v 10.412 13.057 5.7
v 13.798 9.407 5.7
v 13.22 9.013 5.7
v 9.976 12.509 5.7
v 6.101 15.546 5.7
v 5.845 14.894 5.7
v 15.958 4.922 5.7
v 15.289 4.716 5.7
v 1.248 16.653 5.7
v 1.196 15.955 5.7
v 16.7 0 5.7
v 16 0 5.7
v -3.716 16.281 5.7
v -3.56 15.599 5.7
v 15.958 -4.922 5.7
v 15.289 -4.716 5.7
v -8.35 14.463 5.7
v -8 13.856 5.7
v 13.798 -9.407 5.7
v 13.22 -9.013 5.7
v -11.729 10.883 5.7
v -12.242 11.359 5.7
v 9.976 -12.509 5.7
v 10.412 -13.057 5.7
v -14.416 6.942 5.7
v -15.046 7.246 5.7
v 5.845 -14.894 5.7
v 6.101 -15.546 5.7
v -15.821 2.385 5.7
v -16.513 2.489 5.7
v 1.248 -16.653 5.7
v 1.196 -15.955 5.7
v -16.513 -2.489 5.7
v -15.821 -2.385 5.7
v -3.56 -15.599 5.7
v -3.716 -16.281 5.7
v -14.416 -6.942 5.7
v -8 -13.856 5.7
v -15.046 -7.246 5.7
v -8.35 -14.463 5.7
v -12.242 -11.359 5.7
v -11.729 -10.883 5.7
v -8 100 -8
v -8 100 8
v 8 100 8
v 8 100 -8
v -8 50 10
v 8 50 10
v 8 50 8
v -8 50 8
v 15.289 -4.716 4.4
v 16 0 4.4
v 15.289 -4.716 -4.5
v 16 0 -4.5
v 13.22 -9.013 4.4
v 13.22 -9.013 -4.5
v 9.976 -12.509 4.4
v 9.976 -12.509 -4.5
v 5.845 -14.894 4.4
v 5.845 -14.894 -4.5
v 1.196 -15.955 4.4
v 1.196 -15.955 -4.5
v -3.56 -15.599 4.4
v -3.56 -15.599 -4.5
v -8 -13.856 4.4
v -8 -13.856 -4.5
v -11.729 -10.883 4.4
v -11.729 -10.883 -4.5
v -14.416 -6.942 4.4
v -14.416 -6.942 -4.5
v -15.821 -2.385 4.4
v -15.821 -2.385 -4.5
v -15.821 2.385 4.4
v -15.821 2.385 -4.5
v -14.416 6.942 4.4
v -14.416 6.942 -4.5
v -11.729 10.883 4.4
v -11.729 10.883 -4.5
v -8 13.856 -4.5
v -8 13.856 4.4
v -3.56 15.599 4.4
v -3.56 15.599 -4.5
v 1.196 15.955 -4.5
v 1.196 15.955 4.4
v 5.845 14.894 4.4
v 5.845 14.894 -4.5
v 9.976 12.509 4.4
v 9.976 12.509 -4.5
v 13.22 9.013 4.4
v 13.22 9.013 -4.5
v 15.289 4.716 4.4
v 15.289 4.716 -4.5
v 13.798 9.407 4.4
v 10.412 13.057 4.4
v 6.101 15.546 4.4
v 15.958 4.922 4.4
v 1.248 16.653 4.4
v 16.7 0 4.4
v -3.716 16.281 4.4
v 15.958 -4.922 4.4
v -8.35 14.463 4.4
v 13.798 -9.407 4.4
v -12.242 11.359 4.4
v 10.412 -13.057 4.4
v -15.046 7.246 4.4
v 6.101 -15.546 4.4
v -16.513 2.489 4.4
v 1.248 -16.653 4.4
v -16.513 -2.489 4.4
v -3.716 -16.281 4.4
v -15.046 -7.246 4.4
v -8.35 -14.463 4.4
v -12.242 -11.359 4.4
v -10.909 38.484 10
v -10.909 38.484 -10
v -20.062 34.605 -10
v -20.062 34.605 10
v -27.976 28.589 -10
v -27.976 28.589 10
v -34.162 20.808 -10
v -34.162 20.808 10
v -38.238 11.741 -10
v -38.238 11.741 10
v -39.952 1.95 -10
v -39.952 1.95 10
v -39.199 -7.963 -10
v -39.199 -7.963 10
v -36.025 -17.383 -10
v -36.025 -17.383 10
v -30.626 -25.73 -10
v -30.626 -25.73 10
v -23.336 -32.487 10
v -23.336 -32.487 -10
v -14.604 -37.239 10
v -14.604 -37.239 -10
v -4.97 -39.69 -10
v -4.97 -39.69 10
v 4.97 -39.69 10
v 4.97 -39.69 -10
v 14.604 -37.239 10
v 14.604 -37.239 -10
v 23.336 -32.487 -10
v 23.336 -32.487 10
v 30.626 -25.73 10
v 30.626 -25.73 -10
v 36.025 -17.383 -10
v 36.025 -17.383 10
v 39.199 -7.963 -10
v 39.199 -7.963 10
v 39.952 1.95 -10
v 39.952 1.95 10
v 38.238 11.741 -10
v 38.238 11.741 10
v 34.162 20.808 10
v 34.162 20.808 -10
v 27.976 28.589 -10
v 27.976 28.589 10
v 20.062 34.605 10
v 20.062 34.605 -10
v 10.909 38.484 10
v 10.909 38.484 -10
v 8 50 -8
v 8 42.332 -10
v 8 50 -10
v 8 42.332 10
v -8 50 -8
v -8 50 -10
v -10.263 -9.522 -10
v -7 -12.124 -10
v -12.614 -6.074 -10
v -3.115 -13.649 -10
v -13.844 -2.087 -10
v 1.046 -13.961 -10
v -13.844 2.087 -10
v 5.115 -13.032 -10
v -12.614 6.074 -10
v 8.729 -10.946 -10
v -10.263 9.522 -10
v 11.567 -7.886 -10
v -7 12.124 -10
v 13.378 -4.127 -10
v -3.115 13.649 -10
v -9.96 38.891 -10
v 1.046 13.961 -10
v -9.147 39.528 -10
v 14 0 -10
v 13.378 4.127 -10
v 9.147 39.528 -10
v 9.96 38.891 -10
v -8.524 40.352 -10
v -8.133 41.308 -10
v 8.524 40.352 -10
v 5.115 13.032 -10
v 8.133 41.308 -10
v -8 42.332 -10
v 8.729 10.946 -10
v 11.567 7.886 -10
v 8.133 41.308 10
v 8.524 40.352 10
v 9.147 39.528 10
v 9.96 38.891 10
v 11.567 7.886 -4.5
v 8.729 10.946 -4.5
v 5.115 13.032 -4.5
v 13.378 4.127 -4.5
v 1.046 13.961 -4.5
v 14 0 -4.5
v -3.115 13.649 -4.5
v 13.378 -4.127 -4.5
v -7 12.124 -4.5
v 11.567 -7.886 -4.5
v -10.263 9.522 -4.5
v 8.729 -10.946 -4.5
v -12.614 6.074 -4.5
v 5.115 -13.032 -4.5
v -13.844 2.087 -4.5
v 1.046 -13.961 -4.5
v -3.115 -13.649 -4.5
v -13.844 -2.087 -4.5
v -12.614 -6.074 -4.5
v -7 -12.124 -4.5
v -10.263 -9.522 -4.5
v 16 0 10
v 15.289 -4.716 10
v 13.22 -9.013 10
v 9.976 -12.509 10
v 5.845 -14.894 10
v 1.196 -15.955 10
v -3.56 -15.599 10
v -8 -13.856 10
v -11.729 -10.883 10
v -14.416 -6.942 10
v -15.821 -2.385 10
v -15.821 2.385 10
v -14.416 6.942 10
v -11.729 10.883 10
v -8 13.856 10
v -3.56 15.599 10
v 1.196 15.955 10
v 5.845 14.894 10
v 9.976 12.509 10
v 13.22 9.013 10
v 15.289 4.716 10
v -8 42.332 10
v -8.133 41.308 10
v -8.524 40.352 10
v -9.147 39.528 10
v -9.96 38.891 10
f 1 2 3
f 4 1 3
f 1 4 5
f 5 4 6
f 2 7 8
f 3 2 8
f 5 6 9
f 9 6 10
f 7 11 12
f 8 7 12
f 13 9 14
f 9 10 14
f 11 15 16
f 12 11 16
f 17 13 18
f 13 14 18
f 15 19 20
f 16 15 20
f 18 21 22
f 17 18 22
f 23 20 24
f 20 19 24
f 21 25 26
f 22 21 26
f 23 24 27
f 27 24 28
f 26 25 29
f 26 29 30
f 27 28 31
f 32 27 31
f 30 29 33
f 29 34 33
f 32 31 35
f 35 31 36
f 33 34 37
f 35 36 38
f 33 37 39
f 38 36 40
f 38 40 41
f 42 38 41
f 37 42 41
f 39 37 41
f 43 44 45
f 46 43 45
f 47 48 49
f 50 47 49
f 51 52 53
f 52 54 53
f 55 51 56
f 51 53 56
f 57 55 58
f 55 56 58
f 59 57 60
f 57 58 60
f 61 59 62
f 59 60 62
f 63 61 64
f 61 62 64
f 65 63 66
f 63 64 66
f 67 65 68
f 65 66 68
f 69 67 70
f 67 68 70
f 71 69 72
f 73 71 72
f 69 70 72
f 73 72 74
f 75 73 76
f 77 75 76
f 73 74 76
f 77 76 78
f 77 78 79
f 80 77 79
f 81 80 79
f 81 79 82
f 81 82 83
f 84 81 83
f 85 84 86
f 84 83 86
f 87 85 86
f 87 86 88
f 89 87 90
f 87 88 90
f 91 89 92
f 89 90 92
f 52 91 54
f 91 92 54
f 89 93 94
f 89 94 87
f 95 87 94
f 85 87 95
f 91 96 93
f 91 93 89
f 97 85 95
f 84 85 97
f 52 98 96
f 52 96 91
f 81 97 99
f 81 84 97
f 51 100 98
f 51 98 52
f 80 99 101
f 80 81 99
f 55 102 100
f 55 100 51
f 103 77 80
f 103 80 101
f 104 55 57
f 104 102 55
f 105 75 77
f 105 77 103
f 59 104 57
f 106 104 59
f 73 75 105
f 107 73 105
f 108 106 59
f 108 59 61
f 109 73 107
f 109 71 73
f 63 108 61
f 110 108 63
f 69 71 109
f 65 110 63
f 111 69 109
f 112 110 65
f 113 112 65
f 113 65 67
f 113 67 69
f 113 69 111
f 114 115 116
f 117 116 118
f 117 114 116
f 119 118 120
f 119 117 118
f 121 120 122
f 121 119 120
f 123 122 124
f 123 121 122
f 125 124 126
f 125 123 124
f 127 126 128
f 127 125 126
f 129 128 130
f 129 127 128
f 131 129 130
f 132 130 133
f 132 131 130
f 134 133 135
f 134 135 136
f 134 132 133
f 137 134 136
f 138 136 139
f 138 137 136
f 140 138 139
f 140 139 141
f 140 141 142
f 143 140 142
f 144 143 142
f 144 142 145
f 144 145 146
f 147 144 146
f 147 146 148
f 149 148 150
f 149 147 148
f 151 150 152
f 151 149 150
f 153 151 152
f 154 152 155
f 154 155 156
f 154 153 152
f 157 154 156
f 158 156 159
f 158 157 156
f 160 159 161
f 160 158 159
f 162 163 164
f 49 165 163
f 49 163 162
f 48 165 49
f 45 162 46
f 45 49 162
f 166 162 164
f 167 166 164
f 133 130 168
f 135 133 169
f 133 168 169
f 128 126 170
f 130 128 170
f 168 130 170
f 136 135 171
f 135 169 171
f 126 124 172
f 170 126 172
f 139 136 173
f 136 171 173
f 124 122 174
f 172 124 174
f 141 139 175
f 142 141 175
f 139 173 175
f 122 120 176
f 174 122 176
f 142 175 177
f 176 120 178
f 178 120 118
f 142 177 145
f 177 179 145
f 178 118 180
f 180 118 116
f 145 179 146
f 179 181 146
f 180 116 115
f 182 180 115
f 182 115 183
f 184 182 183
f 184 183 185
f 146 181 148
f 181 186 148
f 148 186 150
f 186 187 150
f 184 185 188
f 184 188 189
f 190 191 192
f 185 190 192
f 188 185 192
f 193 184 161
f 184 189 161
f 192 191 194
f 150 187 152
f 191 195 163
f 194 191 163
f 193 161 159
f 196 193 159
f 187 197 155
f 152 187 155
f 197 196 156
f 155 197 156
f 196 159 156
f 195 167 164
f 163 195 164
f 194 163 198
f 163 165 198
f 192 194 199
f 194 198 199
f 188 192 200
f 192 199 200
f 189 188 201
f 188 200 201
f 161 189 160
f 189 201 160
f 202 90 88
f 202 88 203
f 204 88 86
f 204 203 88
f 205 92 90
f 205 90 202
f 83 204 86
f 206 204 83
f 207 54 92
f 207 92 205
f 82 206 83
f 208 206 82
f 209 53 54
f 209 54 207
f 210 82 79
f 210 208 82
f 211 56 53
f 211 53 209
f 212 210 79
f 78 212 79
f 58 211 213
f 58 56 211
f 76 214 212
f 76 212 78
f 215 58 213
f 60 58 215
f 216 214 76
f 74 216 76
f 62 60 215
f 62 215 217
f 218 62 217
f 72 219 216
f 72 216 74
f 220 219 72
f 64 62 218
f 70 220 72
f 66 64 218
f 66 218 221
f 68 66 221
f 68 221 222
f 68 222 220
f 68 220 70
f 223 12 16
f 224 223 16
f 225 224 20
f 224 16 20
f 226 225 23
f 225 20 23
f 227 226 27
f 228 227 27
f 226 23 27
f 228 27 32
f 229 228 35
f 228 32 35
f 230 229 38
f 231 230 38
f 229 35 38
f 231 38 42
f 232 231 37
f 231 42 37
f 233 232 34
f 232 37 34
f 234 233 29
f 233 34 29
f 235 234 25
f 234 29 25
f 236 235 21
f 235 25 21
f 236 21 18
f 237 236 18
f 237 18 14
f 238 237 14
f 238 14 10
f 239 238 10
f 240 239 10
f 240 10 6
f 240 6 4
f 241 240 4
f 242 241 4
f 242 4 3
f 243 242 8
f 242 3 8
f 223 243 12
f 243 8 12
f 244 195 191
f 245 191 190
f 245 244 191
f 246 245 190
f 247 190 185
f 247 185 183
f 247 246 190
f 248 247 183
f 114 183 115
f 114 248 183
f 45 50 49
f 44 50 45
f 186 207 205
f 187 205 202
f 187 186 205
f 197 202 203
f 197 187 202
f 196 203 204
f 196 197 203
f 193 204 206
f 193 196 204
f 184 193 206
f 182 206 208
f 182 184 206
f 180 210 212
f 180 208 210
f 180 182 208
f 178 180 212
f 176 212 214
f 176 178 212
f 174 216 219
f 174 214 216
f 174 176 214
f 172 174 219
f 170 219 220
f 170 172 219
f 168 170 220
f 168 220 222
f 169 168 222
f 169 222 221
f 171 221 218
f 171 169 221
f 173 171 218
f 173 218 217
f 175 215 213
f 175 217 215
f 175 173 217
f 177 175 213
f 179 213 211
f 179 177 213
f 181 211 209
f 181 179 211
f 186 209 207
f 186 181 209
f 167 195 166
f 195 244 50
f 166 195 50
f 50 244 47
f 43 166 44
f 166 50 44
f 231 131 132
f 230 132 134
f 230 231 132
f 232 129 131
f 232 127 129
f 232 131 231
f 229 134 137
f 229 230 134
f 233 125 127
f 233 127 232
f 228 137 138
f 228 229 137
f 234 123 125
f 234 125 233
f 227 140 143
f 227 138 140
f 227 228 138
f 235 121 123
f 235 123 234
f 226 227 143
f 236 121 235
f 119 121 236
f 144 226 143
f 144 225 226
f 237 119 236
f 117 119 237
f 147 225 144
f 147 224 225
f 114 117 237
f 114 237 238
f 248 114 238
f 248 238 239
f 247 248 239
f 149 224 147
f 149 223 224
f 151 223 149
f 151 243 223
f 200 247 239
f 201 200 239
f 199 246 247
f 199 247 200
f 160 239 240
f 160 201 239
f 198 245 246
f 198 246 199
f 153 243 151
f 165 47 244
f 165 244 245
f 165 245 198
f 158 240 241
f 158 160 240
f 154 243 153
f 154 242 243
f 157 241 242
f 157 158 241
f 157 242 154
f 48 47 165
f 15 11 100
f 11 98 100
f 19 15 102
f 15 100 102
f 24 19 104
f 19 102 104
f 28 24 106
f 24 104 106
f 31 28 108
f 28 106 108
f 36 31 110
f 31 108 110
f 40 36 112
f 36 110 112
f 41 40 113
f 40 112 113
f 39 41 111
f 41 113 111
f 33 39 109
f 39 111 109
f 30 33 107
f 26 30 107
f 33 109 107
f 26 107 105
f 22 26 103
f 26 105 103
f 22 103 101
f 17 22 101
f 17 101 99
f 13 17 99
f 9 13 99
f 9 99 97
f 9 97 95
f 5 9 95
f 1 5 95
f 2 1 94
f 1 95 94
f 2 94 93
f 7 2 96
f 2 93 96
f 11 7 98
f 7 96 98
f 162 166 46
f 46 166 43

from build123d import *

# Parameters (mm, degrees)
SKETCH1_R               = 40
SKETCH1_R_2             = 14
BOSS_EXTRUDE1_DEPTH     = 10
SKETCH2_W               = 16
SKETCH2_H               = 60.808164115
BOSS_EXTRUDE2_DEPTH     = 10
FILLET1_R               = 4
SKETCH3_W               = 14.5
SKETCH3_H               = 2
SKETCH4_W               = 1.3
SKETCH4_H               = 0.7
CUT_EXTRUDE1_DEPTH      = 109.166538264
CUT_EXTRUDE1_DEPTH_BACK = 109.166538264
SKETCH5_W               = 2
SKETCH5_H               = 50


with BuildPart() as part:
    # Sketch1 → Boss-Extrude1 (new, symmetric)
    with BuildSketch(Plane.XY):
        Circle(SKETCH1_R)
        Circle(SKETCH1_R_2, mode=Mode.SUBTRACT)
    extrude(amount=BOSS_EXTRUDE1_DEPTH, both=True)

    # Sketch2 → Boss-Extrude2 (add, symmetric)
    with BuildSketch(Plane.XY):
        with Locations((0, 69.595917942)):
            Rectangle(SKETCH2_W, SKETCH2_H)
    extrude(amount=BOSS_EXTRUDE2_DEPTH, both=True)

    # Fillet1
    fillet1_edges = [part.edges().sort_by_distance(p)[0] for p in [
        (-8, 39.191835885, 0),
        (8, 39.191835885, 0),
    ]]
    fillet(fillet1_edges, radius=FILLET1_R)

    # Sketch3 → Cut-Revolve1 (revolve, cut)
    with BuildSketch(Plane(origin=(0, 0, 0), x_dir=(0, 0, -1), z_dir=(1, 0, 0)), mode=Mode.PRIVATE) as cut_revolve1_sk:
        with Locations((-2.75, 15)):
            Rectangle(SKETCH3_W, SKETCH3_H)
    revolve(cut_revolve1_sk.sketch.rotate(Axis((0, 0, 0), (0, 0, -1)), 90), axis=Axis((0, 0, 0), (0, 0, -1)), mode=Mode.SUBTRACT)

    # Sketch4 → Cut-Revolve2 (revolve, cut)
    with BuildSketch(Plane(origin=(0, 0, 0), x_dir=(0, 0, -1), z_dir=(1, 0, 0)), mode=Mode.PRIVATE) as cut_revolve2_sk:
        with Locations((-5.05, 16.35)):
            Rectangle(SKETCH4_W, SKETCH4_H)
    revolve(cut_revolve2_sk.sketch.rotate(Axis((0, 0, 0), (0, 0, -1)), 90), axis=Axis((0, 0, 0), (0, 0, -1)), mode=Mode.SUBTRACT)

    # Sketch5 → Cut-Extrude1 (cut, two sides: drawn at the far end of the back side and taken through both)
    with BuildSketch(Plane(origin=(0, 0, 0), x_dir=(0, 0, -1), z_dir=(1, 0, 0)).offset(-CUT_EXTRUDE1_DEPTH_BACK)):
        with Locations((9, 75)):
            Rectangle(SKETCH5_W, SKETCH5_H)
        with Locations((-9, 75)):
            Rectangle(SKETCH5_W, SKETCH5_H)
    extrude(amount=CUT_EXTRUDE1_DEPTH + CUT_EXTRUDE1_DEPTH_BACK, mode=Mode.SUBTRACT)


solid = part.part
